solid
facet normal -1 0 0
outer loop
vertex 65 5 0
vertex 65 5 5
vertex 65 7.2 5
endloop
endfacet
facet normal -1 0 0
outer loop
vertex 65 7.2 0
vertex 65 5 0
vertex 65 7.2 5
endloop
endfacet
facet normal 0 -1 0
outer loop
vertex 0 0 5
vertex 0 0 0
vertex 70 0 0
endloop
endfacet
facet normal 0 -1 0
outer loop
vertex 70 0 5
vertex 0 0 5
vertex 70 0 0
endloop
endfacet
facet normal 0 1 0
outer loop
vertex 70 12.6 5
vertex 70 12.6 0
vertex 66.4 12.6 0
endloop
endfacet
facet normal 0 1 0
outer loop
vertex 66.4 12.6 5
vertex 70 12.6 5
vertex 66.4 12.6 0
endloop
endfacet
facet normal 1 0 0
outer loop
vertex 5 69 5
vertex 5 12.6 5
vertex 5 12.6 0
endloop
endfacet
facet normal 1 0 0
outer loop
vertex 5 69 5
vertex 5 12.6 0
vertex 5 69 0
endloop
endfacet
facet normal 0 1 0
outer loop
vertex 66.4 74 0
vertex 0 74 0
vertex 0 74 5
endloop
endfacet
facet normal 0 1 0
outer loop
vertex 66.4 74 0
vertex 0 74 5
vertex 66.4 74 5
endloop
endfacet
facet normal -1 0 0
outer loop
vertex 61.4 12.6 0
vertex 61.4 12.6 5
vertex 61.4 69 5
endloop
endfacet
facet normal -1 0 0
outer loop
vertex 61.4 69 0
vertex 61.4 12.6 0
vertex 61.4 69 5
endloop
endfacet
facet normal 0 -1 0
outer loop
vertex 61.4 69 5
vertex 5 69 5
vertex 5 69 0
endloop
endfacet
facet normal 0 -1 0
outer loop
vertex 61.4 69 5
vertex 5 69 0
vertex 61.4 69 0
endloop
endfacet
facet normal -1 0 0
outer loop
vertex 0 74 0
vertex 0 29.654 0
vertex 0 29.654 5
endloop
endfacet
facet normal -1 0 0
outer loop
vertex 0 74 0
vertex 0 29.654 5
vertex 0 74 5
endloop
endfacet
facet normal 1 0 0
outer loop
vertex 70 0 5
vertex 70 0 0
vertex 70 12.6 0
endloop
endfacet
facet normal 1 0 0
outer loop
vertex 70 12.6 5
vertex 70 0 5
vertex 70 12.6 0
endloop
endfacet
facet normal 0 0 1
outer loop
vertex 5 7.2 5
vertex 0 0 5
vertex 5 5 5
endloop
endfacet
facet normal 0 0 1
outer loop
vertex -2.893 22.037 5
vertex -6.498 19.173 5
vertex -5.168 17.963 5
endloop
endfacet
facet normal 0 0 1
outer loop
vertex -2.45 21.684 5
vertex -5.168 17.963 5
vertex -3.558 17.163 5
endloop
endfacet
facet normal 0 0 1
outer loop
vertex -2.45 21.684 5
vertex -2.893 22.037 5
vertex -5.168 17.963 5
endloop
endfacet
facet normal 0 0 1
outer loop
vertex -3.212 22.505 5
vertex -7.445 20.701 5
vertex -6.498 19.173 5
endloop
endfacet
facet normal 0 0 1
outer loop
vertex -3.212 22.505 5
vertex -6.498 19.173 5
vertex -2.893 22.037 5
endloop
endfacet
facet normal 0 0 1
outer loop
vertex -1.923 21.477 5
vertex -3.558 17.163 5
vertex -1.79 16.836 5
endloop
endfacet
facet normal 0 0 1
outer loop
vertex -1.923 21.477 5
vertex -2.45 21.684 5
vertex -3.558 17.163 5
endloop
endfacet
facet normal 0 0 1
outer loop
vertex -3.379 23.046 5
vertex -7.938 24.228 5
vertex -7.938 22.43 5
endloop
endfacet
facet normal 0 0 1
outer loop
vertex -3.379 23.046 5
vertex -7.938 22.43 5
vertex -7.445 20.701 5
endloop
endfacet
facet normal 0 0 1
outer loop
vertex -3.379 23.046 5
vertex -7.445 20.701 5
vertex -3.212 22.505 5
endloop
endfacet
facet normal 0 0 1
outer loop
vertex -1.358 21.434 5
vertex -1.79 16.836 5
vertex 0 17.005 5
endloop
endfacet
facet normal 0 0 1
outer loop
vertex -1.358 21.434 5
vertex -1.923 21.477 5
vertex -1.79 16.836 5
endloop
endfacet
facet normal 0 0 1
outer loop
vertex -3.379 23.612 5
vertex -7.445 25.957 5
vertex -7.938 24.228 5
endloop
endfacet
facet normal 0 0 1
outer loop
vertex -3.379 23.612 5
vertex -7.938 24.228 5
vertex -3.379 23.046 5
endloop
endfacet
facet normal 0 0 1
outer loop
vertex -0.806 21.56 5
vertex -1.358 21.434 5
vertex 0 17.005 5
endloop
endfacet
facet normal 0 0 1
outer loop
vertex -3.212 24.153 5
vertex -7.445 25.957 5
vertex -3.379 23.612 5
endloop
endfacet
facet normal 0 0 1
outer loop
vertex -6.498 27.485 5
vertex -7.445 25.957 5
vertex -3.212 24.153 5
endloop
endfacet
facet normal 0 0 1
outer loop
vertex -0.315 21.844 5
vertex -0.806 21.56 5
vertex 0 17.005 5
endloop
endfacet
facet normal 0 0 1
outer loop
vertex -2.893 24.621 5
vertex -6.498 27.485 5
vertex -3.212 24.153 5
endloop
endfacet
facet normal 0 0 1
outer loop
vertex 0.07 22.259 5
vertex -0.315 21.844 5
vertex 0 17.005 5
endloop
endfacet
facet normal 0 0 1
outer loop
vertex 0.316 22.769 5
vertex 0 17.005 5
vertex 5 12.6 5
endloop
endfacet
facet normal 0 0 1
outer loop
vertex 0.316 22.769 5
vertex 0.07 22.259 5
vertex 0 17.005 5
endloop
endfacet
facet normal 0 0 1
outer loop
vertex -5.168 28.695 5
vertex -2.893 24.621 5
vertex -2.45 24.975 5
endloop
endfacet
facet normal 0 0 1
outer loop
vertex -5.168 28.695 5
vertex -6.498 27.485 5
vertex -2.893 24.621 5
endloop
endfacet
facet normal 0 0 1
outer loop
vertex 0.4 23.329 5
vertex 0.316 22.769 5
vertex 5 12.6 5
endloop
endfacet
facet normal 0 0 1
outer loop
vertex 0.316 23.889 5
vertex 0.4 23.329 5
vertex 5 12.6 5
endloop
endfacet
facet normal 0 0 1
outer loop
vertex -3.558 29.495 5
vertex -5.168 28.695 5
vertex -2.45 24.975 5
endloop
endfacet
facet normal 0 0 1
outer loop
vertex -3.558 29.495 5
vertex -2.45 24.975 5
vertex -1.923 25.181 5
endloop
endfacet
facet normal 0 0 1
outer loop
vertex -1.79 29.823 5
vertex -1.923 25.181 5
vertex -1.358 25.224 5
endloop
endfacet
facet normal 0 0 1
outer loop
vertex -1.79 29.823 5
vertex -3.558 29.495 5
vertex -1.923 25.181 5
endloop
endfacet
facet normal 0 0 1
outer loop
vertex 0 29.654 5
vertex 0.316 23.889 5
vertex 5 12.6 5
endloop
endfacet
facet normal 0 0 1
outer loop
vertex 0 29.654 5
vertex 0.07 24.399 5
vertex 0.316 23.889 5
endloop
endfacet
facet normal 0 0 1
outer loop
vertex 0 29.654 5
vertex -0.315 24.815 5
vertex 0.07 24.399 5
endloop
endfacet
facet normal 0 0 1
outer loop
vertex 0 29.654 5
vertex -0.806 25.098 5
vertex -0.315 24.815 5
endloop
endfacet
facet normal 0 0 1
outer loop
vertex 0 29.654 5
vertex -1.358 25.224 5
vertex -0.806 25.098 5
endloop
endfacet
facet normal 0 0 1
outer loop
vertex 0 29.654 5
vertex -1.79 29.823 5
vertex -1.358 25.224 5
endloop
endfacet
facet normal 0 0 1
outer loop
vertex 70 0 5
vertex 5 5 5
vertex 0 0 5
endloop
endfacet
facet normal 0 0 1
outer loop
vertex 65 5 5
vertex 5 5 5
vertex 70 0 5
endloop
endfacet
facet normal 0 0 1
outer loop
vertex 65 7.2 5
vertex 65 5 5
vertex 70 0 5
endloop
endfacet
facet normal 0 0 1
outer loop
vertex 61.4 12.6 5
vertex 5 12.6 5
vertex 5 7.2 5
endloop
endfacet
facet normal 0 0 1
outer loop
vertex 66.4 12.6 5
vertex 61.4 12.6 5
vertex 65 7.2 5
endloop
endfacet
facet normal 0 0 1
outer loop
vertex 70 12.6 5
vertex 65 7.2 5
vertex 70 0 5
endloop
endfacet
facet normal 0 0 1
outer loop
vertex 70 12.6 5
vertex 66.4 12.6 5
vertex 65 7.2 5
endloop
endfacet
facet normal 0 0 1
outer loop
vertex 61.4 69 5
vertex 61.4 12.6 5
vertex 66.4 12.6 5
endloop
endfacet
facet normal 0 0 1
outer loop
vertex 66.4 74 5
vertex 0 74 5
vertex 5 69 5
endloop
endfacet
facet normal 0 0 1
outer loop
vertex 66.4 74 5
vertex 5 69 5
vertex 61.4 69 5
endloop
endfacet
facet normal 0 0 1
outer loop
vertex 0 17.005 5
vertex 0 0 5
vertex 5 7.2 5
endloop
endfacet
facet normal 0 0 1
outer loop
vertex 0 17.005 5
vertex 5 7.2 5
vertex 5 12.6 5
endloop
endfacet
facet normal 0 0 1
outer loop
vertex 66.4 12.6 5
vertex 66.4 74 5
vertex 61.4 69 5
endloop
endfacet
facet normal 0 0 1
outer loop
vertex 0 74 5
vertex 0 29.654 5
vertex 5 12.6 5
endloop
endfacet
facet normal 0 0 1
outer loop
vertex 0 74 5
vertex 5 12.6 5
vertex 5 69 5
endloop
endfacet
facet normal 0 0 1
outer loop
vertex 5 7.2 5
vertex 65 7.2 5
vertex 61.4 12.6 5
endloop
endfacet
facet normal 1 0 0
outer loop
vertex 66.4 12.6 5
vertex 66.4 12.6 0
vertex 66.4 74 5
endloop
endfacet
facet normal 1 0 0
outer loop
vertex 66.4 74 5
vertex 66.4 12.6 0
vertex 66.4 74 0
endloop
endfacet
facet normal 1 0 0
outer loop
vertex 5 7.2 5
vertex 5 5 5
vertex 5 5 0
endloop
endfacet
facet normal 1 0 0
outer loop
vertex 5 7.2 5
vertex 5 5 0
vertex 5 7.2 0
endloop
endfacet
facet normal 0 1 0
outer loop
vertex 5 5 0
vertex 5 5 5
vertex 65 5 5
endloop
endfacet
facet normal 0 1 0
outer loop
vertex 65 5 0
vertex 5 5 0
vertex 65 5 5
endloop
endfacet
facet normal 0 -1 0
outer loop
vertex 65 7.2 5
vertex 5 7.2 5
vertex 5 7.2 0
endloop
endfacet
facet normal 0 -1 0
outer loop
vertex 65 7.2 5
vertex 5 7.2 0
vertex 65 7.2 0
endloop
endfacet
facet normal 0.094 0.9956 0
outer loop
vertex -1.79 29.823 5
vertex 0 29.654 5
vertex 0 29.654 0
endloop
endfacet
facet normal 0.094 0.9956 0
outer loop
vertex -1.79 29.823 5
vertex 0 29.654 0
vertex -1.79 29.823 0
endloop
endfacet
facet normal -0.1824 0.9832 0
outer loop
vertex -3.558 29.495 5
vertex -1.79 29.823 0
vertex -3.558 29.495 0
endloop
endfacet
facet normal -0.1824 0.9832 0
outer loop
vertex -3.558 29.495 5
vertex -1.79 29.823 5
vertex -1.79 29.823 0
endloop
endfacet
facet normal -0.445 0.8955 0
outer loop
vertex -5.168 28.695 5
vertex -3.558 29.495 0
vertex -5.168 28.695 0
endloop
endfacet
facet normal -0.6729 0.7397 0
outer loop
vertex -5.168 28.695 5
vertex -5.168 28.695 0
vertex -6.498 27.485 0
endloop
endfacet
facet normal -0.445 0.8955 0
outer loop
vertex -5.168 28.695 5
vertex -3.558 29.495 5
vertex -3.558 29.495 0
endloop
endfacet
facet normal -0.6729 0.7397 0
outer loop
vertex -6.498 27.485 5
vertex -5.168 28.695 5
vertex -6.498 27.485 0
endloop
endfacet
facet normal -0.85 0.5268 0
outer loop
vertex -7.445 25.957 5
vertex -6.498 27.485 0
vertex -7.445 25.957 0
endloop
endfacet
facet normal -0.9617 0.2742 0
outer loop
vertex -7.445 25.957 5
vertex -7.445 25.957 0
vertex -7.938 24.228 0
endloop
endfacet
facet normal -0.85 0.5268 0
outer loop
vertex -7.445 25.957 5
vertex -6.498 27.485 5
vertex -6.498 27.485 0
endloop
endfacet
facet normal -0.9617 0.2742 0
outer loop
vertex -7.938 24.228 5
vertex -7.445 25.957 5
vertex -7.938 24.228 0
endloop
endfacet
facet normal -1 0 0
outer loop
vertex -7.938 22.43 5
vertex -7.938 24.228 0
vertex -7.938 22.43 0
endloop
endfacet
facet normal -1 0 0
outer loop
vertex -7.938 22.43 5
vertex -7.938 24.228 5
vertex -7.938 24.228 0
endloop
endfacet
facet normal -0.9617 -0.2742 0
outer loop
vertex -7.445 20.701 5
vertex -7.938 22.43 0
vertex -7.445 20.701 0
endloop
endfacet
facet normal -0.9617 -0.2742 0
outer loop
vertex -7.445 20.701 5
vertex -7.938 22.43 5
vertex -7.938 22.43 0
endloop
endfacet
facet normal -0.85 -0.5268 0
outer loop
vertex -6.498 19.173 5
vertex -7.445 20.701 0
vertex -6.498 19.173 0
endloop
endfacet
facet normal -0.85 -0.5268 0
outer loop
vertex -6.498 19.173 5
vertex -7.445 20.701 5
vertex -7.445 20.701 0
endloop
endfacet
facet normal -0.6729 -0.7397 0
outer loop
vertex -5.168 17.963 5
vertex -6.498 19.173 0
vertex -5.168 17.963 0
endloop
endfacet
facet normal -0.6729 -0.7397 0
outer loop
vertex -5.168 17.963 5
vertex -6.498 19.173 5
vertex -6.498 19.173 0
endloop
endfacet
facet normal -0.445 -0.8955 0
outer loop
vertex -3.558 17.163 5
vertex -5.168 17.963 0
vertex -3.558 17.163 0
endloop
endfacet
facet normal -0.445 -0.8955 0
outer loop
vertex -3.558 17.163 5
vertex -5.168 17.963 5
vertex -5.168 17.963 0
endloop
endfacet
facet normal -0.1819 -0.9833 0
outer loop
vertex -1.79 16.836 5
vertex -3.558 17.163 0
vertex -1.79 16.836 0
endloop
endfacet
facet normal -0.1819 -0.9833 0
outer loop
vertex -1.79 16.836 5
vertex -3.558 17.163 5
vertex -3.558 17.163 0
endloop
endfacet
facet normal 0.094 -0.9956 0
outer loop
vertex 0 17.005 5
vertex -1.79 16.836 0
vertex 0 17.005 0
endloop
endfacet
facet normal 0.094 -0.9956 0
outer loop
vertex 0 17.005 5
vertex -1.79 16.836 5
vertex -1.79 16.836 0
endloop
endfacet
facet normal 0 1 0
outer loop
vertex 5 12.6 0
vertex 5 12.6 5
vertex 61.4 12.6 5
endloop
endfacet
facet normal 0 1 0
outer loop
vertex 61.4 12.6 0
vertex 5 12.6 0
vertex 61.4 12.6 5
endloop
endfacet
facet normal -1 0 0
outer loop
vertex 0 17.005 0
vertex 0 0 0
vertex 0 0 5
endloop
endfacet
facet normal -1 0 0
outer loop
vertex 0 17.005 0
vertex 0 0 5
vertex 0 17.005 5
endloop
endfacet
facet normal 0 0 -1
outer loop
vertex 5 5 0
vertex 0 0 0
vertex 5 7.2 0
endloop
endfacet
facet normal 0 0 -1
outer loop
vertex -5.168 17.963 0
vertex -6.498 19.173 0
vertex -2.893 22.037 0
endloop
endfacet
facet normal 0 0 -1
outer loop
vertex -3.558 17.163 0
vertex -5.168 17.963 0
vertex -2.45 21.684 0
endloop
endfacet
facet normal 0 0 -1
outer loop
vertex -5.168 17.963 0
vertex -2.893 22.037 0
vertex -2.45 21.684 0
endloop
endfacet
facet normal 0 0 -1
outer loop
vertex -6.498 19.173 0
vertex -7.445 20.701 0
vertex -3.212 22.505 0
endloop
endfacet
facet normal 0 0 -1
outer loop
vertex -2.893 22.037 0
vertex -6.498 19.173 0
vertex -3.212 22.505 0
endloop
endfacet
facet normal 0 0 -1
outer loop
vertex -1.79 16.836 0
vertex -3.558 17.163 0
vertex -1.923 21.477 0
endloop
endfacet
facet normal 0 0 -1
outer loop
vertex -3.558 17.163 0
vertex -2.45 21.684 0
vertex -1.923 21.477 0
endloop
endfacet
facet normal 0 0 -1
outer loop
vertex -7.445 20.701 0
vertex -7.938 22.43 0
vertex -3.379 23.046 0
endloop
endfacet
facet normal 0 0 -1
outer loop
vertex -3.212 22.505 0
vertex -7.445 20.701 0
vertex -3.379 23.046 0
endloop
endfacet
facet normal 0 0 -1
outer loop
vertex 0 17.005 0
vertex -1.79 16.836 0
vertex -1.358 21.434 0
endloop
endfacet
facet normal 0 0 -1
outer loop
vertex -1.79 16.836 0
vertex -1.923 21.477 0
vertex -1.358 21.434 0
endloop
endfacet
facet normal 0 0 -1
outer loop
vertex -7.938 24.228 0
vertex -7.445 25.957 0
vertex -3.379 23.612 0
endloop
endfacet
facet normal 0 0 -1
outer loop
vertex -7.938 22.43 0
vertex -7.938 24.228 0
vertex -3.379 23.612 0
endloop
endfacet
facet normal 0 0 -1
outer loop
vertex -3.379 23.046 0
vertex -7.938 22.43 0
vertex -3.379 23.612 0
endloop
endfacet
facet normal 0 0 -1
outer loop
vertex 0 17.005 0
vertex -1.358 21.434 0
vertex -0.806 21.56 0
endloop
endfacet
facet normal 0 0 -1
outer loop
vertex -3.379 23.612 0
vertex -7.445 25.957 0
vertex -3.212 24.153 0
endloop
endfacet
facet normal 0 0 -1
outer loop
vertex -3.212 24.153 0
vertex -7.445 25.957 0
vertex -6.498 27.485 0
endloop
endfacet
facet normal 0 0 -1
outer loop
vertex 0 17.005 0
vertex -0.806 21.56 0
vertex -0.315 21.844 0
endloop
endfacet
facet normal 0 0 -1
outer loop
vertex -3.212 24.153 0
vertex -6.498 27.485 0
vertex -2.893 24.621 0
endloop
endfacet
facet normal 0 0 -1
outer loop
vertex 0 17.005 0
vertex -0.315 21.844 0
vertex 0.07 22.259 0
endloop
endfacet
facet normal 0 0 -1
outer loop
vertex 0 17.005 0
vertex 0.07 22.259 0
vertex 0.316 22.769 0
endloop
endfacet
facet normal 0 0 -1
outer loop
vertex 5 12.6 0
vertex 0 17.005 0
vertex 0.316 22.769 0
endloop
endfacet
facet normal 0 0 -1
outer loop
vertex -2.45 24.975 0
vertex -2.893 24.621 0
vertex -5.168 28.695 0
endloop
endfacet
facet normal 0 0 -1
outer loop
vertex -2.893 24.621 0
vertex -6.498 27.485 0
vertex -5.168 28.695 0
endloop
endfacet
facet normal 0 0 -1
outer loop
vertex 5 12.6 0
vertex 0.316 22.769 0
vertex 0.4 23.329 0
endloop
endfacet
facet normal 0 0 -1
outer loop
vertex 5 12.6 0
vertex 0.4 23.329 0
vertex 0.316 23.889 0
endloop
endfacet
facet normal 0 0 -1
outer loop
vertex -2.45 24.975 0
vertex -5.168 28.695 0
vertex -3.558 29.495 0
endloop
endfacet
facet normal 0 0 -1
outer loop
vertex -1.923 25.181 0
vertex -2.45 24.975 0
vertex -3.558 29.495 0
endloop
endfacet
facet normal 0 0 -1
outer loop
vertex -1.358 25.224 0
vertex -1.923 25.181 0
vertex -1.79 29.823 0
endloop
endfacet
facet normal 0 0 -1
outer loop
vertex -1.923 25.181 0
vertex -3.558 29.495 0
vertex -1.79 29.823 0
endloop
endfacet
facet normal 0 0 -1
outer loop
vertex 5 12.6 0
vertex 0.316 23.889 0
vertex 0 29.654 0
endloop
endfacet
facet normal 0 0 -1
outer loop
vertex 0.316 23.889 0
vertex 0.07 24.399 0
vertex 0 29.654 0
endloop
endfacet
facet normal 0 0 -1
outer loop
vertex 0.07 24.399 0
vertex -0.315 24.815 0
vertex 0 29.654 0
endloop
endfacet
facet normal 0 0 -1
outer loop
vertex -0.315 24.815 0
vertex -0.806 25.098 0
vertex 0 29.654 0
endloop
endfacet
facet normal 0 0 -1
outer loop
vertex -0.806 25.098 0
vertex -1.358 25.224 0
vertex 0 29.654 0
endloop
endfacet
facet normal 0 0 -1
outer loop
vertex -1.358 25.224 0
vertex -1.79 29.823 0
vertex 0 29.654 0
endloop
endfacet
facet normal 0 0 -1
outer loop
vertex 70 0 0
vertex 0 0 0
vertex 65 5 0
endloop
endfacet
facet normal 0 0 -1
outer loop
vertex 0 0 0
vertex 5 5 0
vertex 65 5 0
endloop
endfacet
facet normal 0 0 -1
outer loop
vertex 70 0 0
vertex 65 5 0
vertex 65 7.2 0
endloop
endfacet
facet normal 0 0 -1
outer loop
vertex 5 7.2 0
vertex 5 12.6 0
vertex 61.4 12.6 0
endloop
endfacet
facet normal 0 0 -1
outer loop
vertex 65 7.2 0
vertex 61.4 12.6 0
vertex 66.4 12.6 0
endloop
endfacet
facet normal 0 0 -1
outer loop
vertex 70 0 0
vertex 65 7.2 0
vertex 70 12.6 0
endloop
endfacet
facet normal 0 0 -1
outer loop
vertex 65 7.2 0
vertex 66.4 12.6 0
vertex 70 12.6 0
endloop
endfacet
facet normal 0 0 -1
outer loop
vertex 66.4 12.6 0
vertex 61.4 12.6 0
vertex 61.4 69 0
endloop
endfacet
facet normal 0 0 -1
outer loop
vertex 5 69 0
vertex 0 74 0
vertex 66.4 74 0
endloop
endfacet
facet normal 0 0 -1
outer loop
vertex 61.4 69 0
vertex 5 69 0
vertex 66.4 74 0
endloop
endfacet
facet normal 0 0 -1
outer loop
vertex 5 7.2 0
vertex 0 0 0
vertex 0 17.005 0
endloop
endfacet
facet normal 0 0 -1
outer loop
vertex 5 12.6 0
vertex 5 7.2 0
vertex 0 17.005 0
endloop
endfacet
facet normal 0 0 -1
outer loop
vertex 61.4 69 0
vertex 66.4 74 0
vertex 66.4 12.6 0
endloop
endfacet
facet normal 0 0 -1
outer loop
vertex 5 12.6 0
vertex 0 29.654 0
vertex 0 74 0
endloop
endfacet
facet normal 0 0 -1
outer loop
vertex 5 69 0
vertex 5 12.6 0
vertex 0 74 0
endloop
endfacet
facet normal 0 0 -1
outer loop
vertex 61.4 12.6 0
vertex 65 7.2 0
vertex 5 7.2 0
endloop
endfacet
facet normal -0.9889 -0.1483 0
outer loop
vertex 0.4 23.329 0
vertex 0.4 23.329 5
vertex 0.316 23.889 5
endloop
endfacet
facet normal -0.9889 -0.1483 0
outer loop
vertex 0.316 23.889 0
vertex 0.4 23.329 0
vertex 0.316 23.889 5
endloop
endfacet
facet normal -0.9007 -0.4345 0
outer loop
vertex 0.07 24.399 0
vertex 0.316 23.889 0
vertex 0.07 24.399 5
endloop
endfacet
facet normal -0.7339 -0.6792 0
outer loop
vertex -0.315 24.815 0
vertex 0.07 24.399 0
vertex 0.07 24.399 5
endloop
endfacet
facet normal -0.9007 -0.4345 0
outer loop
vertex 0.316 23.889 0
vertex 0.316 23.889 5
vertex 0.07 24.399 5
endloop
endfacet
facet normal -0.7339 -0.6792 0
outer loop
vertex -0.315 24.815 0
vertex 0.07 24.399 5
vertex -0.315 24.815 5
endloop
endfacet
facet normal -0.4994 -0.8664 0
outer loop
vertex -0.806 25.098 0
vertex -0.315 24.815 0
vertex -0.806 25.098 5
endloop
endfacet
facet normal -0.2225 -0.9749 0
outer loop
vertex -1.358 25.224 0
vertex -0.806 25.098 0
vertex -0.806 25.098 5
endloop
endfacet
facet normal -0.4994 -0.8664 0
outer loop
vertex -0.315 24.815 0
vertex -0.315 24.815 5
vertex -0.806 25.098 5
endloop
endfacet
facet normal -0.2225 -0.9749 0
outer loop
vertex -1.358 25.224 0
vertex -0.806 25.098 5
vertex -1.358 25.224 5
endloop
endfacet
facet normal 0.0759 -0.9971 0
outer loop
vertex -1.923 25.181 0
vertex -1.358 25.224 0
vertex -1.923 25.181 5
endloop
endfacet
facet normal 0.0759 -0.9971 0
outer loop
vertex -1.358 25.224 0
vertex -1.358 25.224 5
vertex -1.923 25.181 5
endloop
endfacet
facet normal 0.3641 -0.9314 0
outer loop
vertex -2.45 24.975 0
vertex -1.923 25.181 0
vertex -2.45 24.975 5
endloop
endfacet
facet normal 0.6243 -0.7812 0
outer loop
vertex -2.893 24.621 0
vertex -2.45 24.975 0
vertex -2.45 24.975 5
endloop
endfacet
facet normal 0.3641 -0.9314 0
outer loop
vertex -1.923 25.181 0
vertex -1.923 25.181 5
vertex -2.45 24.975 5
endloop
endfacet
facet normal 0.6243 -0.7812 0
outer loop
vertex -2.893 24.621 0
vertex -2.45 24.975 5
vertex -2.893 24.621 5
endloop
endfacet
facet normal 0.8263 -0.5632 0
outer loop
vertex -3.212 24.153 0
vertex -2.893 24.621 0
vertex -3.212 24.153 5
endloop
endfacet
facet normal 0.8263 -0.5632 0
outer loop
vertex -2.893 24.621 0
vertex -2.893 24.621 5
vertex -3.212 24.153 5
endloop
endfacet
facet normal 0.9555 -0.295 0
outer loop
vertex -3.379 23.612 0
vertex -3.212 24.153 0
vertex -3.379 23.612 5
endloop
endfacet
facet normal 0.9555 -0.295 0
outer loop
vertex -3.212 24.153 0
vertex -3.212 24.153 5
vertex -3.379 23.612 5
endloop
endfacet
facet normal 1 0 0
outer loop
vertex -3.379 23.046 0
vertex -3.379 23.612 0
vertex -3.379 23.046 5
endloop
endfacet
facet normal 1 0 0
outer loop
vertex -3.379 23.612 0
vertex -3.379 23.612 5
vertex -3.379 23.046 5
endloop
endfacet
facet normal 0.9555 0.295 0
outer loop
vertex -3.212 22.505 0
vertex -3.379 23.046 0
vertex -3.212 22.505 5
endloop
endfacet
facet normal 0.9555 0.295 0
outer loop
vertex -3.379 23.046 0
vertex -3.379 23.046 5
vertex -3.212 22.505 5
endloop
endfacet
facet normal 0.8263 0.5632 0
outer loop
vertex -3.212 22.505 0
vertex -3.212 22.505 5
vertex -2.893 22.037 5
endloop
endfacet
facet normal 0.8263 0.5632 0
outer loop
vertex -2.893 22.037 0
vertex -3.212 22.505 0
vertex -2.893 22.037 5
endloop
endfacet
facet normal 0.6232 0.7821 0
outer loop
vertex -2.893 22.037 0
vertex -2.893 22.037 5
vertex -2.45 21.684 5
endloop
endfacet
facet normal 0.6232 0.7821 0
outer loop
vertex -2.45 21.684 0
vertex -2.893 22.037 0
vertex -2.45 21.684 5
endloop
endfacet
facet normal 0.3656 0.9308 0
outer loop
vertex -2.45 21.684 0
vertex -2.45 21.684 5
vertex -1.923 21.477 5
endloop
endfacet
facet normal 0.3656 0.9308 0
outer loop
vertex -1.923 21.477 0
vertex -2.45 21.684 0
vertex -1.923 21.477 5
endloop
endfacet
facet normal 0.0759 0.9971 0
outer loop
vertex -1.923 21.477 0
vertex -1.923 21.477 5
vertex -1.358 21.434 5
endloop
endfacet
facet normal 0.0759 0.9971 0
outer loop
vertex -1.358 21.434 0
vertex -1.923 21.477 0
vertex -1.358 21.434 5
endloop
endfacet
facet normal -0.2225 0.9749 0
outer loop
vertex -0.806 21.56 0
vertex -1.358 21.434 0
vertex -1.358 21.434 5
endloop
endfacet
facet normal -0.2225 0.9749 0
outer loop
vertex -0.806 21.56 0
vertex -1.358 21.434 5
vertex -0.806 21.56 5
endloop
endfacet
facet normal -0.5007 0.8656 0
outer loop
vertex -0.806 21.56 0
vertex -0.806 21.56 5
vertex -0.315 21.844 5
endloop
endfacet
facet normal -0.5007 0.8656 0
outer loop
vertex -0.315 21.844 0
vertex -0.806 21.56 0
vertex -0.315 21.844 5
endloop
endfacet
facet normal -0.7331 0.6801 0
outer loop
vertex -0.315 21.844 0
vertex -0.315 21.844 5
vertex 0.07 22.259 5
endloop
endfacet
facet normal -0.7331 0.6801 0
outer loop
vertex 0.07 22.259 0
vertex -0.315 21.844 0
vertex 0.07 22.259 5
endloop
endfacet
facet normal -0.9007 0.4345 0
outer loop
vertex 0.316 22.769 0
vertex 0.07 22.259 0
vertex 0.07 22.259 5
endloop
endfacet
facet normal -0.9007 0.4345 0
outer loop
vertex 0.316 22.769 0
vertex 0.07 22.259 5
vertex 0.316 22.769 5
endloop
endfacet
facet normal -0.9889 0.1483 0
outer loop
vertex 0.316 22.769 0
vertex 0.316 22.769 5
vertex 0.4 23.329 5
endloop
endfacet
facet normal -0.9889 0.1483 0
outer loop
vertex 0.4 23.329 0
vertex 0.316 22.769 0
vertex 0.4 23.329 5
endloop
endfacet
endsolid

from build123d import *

# Parameters (mm, degrees)
SKETCH_1_W          = 70
SKETCH_1_H          = 74
EXTRUDE_1_DEPTH     = 5
CUT_EXTRUDE_2_REACH = 103.985
SKETCH_2_W          = 60
SKETCH_2_H          = 2.2
SKETCH_3_W          = 56.4
SKETCH_3_H          = 56.4
CUT_EXTRUDE_3_DEPTH = 20
SKETCH_4_W          = 3.6
SKETCH_4_H          = 61.4
CUT_EXTRUDE_5_DEPTH = 102.985293057
SKETCH_5_R          = 6.5
EXTRUDE_6_DEPTH     = 5
CUT_EXTRUDE_7_REACH = 103.985
SKETCH_6_R          = 1.9


with BuildPart() as part:
    # Эскиз1 → Вытянуть1 (new body)
    with BuildSketch(Plane.XY):
        with Locations((35, 37)):
            Rectangle(SKETCH_1_W, SKETCH_1_H)
    extrude(amount=EXTRUDE_1_DEPTH)

    # Эскиз2 → Вытянуть2 (cut, up to next)
    with BuildSketch(Plane.XY.offset(5), mode=Mode.PRIVATE) as cut_extrude_2_sk1:
        with Locations((35, 6.1)):
            Rectangle(SKETCH_2_W, SKETCH_2_H)
    cut_extrude_2_tool1 = extrude(cut_extrude_2_sk1.sketch, amount=-CUT_EXTRUDE_2_REACH, mode=Mode.PRIVATE) & part.part
    add(cut_extrude_2_tool1.solids().sort_by_distance((35, 6.1, 5))[0], mode=Mode.SUBTRACT)

    # Эскиз3 → Вытянуть3 (cut)
    with BuildSketch(Plane.XY.offset(5)):
        with Locations((33.2, 40.8)):
            Rectangle(SKETCH_3_W, SKETCH_3_H)
    extrude(amount=-CUT_EXTRUDE_3_DEPTH, mode=Mode.SUBTRACT)

    # Эскиз4 → Вытянуть5 (cut, through all)
    with BuildSketch(Plane(origin=(0, 0, 0), x_dir=(-1, 0, 0), z_dir=(0, 0, -1))):
        with Locations((-68.2, 43.3)):
            Rectangle(SKETCH_4_W, SKETCH_4_H)
    extrude(amount=-CUT_EXTRUDE_5_DEPTH, mode=Mode.SUBTRACT)

    # Эскиз5 → Вытянуть6 (add)
    with BuildSketch(Plane.XY.offset(5)):
        with Locations((-1.5, 23.329095616)):
            Circle(SKETCH_5_R)
    extrude(amount=-EXTRUDE_6_DEPTH)

    # Эскиз6 → Вытянуть7 (cut, up to next)
    with BuildSketch(Plane.XY.offset(5), mode=Mode.PRIVATE) as cut_extrude_7_sk1:
        with Locations((-1.5, 23.329095616)):
            Circle(SKETCH_6_R)
    cut_extrude_7_tool1 = extrude(cut_extrude_7_sk1.sketch, amount=-CUT_EXTRUDE_7_REACH, mode=Mode.PRIVATE) & part.part
    add(cut_extrude_7_tool1.solids().sort_by_distance((-1.5, 23.329096, 5))[0], mode=Mode.SUBTRACT)


solid = part.part
